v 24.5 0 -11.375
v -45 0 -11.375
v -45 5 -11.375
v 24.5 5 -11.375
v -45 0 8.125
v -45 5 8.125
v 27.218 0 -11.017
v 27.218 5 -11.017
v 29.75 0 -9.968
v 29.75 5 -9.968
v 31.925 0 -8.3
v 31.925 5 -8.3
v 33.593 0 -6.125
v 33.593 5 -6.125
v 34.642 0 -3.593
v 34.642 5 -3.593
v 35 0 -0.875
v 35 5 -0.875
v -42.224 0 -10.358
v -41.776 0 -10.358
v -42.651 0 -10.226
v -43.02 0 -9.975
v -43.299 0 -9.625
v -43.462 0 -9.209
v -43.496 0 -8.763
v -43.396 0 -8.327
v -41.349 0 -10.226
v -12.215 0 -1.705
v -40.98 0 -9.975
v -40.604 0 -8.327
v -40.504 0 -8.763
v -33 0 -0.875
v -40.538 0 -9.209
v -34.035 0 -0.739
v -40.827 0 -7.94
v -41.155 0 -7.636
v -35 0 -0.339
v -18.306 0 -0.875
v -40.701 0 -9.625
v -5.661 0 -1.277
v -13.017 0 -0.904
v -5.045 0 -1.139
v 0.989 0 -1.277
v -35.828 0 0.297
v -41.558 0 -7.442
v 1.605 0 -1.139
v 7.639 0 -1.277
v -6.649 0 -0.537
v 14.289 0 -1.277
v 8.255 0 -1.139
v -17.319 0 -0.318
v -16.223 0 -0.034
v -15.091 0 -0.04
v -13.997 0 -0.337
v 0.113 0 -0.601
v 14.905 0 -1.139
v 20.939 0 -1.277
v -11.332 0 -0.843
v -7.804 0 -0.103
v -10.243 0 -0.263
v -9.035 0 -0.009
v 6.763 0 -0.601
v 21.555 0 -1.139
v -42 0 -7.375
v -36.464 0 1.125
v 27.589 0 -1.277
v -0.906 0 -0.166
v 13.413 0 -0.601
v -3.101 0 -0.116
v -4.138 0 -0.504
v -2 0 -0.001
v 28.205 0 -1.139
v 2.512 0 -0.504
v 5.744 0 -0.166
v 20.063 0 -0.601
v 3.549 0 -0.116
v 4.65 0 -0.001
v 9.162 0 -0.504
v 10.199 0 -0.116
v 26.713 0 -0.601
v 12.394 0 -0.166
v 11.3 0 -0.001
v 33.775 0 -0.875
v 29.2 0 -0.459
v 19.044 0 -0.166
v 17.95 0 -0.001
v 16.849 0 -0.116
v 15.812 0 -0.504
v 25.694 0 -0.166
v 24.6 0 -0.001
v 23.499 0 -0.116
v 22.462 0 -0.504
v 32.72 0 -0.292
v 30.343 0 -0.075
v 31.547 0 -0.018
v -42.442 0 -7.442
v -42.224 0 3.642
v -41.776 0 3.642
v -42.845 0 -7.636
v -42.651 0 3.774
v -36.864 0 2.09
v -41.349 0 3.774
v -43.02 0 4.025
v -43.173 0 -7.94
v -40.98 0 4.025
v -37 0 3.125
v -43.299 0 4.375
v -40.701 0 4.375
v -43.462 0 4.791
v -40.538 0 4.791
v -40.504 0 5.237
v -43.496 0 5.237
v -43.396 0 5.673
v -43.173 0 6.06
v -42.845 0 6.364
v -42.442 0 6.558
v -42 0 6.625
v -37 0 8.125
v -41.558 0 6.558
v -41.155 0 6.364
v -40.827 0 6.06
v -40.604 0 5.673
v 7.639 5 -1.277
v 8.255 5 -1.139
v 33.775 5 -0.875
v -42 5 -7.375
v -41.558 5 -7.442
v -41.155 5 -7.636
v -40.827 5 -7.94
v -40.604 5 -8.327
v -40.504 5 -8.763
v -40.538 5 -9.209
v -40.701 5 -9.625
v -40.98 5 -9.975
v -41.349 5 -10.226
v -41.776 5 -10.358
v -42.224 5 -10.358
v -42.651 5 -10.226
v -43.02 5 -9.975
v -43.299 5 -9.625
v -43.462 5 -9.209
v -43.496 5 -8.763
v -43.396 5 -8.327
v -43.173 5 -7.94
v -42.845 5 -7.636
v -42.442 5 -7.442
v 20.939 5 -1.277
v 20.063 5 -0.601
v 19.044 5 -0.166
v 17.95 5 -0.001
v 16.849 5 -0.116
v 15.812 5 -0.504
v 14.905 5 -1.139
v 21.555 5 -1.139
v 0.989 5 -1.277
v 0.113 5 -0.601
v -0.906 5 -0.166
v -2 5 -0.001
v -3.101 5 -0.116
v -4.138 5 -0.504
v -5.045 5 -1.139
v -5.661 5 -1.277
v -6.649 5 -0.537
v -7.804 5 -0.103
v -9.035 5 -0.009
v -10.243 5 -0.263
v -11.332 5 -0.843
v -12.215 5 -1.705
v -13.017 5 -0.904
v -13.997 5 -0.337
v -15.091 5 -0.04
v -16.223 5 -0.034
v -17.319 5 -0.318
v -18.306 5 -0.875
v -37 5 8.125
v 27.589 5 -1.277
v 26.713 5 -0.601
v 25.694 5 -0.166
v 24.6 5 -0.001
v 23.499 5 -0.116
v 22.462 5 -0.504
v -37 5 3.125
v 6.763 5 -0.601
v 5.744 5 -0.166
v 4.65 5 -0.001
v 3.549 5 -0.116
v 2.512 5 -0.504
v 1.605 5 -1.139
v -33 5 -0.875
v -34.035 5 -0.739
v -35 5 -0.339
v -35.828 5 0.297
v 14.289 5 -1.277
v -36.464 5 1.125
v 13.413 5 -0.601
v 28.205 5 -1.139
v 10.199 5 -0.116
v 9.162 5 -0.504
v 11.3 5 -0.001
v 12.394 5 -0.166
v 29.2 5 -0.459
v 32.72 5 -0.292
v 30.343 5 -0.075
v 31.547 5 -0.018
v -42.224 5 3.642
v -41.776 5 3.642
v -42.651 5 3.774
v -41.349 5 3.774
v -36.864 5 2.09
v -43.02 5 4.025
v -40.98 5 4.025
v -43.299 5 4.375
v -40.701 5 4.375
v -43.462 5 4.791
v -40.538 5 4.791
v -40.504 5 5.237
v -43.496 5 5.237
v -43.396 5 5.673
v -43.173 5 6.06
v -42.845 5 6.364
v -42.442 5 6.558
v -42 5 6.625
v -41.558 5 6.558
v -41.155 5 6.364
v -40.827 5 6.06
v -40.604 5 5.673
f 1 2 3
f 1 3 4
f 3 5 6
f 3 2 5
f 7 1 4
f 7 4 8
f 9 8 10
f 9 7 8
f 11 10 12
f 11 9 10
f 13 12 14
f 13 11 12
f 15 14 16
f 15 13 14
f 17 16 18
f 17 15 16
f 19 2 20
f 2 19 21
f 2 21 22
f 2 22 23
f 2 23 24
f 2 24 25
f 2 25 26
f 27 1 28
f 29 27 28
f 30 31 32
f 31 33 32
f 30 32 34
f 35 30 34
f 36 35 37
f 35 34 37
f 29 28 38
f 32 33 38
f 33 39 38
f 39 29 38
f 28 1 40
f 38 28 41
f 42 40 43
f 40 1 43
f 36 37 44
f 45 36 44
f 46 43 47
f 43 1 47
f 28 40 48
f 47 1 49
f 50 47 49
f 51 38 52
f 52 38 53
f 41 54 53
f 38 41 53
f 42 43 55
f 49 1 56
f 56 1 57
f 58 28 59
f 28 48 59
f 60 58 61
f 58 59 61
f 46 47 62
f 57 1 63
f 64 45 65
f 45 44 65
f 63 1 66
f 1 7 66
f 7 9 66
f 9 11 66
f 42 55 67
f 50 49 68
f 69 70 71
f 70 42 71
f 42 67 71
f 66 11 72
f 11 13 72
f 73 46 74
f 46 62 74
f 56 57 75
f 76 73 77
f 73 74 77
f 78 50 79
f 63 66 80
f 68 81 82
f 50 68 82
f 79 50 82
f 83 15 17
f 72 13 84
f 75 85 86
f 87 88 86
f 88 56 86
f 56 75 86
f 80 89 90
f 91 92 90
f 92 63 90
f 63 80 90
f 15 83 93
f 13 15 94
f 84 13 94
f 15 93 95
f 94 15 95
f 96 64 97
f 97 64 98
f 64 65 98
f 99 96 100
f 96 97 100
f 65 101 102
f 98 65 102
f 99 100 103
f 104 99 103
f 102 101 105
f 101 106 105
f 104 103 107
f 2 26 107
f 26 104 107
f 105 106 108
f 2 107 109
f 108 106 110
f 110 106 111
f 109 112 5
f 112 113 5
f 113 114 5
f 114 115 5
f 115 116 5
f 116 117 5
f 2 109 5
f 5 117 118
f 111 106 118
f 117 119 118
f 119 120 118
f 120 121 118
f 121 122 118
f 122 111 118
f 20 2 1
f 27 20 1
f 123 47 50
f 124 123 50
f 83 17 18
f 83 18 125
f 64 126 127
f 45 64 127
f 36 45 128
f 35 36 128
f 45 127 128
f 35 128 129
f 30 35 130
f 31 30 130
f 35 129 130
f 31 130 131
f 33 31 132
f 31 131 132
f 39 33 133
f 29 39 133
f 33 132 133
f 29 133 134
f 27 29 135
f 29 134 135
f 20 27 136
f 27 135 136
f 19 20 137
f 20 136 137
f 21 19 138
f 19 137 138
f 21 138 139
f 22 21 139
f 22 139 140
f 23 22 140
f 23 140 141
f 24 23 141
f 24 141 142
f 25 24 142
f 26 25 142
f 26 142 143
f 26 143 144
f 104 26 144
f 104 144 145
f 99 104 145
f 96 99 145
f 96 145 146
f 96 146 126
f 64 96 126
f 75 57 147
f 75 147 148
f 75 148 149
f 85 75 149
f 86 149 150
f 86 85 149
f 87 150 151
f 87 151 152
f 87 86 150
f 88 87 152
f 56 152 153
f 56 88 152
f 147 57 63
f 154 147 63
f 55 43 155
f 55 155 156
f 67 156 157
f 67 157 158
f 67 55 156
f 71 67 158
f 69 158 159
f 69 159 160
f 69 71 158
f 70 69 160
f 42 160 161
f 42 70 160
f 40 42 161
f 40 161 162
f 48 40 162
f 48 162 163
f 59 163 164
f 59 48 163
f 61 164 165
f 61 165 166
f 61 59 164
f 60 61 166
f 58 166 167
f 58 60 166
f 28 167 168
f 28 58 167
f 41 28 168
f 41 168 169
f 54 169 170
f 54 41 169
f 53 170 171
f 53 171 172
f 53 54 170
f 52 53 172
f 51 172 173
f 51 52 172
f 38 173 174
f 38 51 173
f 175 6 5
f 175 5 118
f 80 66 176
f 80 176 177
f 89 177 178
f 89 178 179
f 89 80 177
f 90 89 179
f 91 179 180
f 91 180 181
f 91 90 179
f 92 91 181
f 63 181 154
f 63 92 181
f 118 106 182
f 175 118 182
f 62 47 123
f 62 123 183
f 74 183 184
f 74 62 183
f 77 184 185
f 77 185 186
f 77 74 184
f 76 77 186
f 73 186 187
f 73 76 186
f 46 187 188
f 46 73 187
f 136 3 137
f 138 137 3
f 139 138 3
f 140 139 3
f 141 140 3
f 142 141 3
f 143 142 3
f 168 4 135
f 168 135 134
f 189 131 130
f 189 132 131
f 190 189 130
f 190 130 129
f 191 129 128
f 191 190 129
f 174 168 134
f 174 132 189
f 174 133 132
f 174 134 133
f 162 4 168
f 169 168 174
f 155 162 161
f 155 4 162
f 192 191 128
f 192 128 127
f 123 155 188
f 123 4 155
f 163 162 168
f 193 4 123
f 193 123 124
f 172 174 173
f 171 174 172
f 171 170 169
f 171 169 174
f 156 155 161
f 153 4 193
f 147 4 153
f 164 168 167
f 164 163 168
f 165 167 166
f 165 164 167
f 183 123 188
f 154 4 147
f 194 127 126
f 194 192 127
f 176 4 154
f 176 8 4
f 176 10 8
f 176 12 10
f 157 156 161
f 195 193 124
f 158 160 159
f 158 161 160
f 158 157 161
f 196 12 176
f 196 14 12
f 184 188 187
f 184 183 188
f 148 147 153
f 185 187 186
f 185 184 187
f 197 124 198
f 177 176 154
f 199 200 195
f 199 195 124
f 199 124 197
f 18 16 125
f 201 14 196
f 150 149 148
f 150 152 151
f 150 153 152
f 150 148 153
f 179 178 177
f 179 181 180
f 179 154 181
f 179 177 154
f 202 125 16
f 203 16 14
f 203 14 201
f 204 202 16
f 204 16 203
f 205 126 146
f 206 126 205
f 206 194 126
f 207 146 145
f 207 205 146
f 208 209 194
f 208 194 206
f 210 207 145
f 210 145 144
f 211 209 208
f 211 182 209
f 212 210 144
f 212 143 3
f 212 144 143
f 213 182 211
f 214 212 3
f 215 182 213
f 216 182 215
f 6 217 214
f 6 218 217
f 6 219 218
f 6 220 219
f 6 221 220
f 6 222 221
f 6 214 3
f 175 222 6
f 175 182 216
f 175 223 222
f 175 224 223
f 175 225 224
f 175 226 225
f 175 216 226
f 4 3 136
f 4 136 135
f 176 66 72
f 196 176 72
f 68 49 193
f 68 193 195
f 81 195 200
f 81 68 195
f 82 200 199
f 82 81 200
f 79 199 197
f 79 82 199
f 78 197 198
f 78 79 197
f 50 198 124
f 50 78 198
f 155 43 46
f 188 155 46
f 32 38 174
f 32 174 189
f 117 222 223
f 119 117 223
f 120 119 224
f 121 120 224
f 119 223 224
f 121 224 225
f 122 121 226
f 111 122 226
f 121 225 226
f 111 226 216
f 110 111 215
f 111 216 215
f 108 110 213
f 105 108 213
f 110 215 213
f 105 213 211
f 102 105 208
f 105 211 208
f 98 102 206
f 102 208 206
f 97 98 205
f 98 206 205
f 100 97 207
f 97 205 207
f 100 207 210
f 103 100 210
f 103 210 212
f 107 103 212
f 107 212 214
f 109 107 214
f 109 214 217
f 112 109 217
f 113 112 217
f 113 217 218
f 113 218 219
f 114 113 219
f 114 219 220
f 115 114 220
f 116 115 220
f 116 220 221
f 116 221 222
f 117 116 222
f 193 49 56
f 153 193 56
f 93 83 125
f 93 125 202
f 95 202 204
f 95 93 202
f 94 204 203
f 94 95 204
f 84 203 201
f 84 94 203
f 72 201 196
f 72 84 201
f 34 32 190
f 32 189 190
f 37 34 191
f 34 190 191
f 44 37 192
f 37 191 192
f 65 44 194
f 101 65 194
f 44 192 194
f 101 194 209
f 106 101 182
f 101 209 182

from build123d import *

# Parameters (mm, degrees)
BOSS_EXTRUDE1_DEPTH = 5
SKETCH2_W           = 8
SKETCH2_H           = 5
BOSS_EXTRUDE2_DEPTH = 9
FILLET1_R           = 4
SKETCH3_R           = 1.5
CUT_EXTRUDE1_DEPTH  = 10


with BuildPart() as part:
    # Sketch1 → Boss-Extrude1 (new body)
    with BuildSketch(Plane.XZ):
        with BuildLine():
            Line((-45, -0.875), (-45, -11.375))
            Line((-45, -11.375), (24.5, -11.375))
            ThreePointArc((24.5, -11.375), (31.924621202, -8.299621202), (35, -0.875))
            Line((35, -0.875), (33.775, -0.875))
            ThreePointArc((33.775, -0.875), (30.670128687, -0.026396946), (27.825, -1.531586558))
            ThreePointArc((27.825, -1.531586558), (24.5, 0), (21.175, -1.531586558))
            ThreePointArc((21.175, -1.531586558), (17.85, 0), (14.525, -1.531586558))
            ThreePointArc((14.525, -1.531586558), (11.2, 0), (7.875, -1.531586558))
            ThreePointArc((7.875, -1.531586558), (4.55, 0), (1.225, -1.531586558))
            ThreePointArc((1.225, -1.531586558), (-2.1, 0), (-5.425, -1.531586558))
            ThreePointArc((-5.425, -1.531586558), (-8.861439615, -0.00141952), (-12.215492713, -1.704609531))
            ThreePointArc((-12.215492713, -1.704609531), (-15.090502578, -0.040031141), (-18.305985425, -0.875))
            Line((-18.305985425, -0.875), (-45, -0.875))
        make_face()
    extrude(amount=-BOSS_EXTRUDE1_DEPTH)

    # Sketch2 → Boss-Extrude2 (add)
    with BuildSketch(Plane.XY.offset(-0.875)):
        with Locations((-41, 2.5)):
            Rectangle(SKETCH2_W, SKETCH2_H)
    extrude(amount=BOSS_EXTRUDE2_DEPTH)

    # Chamfer1
    # the kernel refuses this chamfer: 0.5, 0.339586842 mm, written as the material it adds along each edge
    with BuildSketch(Plane(origin=(-5.425, 0, -1.531586558), x_dir=(0.6961293101624768, 0, 0.7179164182080768), z_dir=(0, 1, 0))) as chamfer1_piece_1:
        with BuildLine():
            Line((0.546593526, 0), (0.018611268, -0.34666682))
            ThreePointArc((0.018611268, -0.34666682), (0.013013217, -0.178188087), (0, 0))
            ThreePointArc((0, 0), (0.281682829, -0.008536435), (0.546593526, 0))
        make_face()
    extrude(amount=5)
    with BuildSketch(Plane(origin=(1.225, 0, -1.531586558), x_dir=(-0.6795651691098796, 0, 0.7336151449722536), z_dir=(0, 1, 0)), Plane(origin=(7.875, 0, -1.531586558), x_dir=(-0.67956516910988, 0, 0.7336151449722534), z_dir=(0, 1, 0)), Plane(origin=(14.525, 0, -1.531586558), x_dir=(-0.679565169109884, 0, 0.7336151449722498), z_dir=(0, 1, 0)), Plane(origin=(21.175, 0, -1.531586558), x_dir=(-0.6795651691098812, 0, 0.7336151449722523), z_dir=(0, 1, 0)), Plane(origin=(27.825, 0, -1.531586558), x_dir=(-0.6795651691098773, 0, 0.7336151449722558), z_dir=(0, 1, 0))) as chamfer1_piece_2:
        with BuildLine():
            Line((0.347166046, 0), (0.029302401, 0.545807522))
            ThreePointArc((0.029302401, 0.545807522), (0.023624929, 0.280820137), (0, 0))
            ThreePointArc((0, 0), (0.178629479, 0.003441996), (0.347166046, 0))
        make_face()
    extrude(amount=5)

    # Fillet1
    fillet1_edges = [part.edges().sort_by_distance(p)[0] for p in [
        (-37, 2.5, -0.875),
    ]]
    fillet(fillet1_edges, radius=FILLET1_R)

    # Sketch3 → Cut-Extrude1 (cut)
    with BuildSketch(Plane(origin=(0, 5, 0), x_dir=(1, 0, 0), z_dir=(0, 1, 0))):
        with Locations(Location((-42, -5.125, 0), (0, 0, 270))):
            Circle(SKETCH3_R)
        with Locations(Location((-42, 8.875, 0), (0, 0, 270))):
            Circle(SKETCH3_R)
    extrude(amount=-CUT_EXTRUDE1_DEPTH, mode=Mode.SUBTRACT)


solid = part.part
